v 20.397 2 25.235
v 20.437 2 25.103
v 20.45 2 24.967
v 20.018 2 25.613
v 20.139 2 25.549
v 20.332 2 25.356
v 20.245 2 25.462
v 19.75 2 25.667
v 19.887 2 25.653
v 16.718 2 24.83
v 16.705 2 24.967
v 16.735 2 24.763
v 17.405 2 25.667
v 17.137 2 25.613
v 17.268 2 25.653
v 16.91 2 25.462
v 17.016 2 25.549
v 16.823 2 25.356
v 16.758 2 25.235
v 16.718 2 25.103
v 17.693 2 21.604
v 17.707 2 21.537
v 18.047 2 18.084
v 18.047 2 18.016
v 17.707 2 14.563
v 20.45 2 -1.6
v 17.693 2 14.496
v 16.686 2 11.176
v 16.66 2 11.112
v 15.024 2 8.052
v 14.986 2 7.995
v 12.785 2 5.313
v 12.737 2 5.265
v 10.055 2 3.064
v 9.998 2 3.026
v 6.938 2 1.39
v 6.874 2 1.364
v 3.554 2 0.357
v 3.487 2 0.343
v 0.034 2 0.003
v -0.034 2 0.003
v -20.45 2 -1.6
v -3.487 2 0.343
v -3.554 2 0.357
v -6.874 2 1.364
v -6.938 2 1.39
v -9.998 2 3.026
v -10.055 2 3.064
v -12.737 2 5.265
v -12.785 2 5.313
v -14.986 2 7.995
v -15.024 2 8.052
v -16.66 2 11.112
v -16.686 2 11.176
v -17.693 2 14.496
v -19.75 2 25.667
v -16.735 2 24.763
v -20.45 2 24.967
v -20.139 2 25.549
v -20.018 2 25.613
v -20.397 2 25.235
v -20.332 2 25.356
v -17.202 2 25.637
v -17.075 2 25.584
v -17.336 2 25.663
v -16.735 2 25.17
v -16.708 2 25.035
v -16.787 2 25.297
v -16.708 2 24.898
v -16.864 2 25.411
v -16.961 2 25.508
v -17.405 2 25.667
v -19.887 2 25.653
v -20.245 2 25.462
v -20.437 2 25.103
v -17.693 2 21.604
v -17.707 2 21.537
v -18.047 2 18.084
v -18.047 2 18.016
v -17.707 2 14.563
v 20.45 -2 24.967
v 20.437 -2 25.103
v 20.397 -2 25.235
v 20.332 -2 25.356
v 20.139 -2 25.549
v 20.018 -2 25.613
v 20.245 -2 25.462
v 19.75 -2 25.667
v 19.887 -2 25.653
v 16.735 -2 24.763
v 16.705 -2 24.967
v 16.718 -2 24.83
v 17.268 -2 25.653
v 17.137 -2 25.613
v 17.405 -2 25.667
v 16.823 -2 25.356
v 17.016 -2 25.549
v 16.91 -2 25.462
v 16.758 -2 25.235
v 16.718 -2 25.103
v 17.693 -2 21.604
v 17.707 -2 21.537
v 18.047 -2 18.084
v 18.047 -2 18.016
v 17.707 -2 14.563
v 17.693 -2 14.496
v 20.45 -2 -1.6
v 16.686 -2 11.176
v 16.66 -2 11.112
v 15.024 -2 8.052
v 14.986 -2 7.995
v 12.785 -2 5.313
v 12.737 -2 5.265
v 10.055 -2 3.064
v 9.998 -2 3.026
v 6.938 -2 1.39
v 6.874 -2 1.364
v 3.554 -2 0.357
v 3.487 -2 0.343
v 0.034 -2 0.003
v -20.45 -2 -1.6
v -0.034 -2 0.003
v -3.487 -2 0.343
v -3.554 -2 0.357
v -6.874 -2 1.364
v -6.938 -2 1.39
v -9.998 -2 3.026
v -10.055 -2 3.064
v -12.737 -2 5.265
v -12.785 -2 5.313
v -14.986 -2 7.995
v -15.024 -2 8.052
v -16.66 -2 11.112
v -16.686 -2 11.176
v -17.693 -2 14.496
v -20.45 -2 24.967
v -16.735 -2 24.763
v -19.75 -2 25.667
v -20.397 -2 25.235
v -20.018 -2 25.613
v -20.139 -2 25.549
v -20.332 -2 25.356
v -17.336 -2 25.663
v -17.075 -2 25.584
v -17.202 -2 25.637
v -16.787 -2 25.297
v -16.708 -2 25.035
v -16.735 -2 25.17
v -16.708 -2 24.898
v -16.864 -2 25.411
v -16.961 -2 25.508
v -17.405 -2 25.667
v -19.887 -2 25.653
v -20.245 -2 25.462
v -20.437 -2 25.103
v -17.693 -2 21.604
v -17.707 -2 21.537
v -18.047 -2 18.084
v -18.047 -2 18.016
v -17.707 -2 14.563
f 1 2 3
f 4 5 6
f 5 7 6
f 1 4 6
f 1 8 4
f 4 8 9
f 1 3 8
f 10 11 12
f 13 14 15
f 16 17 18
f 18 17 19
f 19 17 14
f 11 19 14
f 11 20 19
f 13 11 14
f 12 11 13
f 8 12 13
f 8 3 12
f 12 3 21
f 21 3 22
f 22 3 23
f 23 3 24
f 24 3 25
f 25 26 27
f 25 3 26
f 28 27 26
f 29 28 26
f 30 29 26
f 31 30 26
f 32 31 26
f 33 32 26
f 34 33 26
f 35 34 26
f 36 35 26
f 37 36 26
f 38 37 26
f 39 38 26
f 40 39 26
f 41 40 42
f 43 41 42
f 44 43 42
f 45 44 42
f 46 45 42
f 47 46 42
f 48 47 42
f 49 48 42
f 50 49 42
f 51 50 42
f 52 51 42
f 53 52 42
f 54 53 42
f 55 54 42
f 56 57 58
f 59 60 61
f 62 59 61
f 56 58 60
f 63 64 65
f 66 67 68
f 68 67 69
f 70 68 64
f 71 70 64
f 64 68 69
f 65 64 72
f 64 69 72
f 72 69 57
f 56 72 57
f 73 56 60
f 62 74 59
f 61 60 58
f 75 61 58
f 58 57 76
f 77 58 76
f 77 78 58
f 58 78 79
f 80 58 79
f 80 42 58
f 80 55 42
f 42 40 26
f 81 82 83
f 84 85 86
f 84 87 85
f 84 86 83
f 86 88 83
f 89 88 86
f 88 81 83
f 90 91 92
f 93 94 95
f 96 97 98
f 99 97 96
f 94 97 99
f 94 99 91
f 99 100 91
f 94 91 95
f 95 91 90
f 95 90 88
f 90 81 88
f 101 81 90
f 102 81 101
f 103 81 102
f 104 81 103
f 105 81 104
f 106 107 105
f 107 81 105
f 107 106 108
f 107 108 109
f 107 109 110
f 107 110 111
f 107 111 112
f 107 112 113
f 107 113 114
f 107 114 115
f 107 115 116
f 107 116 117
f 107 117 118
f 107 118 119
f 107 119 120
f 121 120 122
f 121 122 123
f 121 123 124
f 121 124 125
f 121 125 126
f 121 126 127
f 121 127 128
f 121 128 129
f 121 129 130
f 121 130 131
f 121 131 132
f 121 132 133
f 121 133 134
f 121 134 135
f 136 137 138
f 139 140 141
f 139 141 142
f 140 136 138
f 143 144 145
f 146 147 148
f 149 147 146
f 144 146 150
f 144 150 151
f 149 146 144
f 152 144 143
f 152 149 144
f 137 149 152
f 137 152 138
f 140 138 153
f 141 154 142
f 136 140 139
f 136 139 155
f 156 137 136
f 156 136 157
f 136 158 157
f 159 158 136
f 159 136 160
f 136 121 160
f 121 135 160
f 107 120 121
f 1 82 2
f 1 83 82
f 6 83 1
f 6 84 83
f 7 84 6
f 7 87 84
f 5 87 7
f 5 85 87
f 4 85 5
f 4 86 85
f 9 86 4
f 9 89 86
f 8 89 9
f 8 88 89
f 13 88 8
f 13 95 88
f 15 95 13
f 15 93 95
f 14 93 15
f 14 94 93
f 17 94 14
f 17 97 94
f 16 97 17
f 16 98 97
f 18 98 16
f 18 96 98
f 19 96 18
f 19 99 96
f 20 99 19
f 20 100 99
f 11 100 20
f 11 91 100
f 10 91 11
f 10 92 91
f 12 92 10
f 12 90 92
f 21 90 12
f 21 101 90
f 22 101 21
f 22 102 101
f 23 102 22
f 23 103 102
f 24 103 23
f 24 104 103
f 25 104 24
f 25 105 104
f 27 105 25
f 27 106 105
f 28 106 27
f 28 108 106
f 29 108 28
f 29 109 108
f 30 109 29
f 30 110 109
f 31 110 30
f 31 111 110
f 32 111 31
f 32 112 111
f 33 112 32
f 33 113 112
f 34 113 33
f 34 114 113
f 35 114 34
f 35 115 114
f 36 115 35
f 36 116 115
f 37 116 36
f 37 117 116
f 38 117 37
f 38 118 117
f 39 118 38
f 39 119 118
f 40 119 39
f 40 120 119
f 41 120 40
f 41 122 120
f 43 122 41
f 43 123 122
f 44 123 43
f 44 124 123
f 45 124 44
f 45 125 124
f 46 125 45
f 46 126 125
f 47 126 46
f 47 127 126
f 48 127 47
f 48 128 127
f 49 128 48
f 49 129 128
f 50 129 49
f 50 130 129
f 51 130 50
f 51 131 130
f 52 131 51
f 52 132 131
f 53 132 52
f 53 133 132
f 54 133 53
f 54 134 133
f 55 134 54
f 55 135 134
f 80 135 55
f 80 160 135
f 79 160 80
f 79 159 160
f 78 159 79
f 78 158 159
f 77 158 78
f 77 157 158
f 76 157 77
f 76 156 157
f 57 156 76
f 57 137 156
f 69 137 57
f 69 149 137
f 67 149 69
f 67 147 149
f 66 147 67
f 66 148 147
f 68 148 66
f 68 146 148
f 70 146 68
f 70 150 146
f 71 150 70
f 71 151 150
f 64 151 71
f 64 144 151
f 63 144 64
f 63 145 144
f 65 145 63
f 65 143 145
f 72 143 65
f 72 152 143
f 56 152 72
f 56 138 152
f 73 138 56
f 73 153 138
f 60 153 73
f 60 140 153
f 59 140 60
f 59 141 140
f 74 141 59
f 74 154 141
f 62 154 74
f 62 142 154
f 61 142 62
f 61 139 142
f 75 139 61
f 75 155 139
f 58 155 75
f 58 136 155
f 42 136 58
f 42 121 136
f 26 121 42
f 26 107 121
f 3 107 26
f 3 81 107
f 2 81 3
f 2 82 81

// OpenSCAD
// FireLord Device Case

$fn = 32;

solar_panel_len = 160.4;
solar_panel_wid = 138.4;
solar_panel_h = 2.7;

perfboard_len = 90.4;
perfboard_wid = 70.4;
perfboard_thick = 1.6;
perfboard_leeway = 6.0; // spacing under the board
perfboard_hole_dia = 3.0;
// inset distances from each perboard corner
perfboard_hole_corner_x = 1.8+perfboard_hole_dia/2;
perfboard_hole_corner_y = 0.8+perfboard_hole_dia/2;

supercap_dia = 36.1;
supercap_len = 73.3;

lora_screw_shaft_dia = 1.9;
lora_screw_shaft_len = 6.1;
lora_screw_head_dia = 4.0;
lora_screw_head_len = 2.1;
// The LoRa module has three mounting holes in an
// isosceles triangle layout (if they're your vertices)
// These are the holes closest together (the base)
lora_hole_tria_base = 21.8-lora_screw_shaft_dia; // From far hole edge to far hole edge; -dia makes centered.
lora_hole_tria_h = 29.0+lora_screw_shaft_dia/2;
lora_antenna_hole_dia = 2.0;
// Offsets from top-most mount hole to antenna hole
lora_antenna_h_offset_x = -3.7;
lora_antenna_h_offset_y = -2.6;

wall_thick = 1.6;

supercap_clip_h = supercap_dia/6; // How far the clipping portion extends
cap_clip_rounding = 0.7;
cap_clip_section_thick = 4.0;

case_rounding = 4.0;

case_screw_dia = 3.0;

module loraScrewHole2D() {
    circle(d=lora_screw_shaft_dia);
}

module loraScrewHoles2D() {
    translate([-lora_hole_tria_base/2,0])
    circle(d=lora_screw_shaft_dia);
    translate([lora_hole_tria_base/2,0])
    circle(d=lora_screw_shaft_dia);
    translate([0,lora_hole_tria_h]) {
        circle(d=lora_screw_shaft_dia);
        //translate([lora_antenna_h_offset_x,lora_antenna_h_offset_y])
        //circle(d=lora_antenna_hole_dia);
    }
}

module perfboardHole2D() {
    circle(d=perfboard_hole_dia);
}

module perfboardHoles2D() {
    x_val = perfboard_len/2-perfboard_hole_corner_x;
    y_val = perfboard_wid/2-perfboard_hole_corner_y;

    translate([x_val, y_val])
    perfboardHole2D();
    translate([-x_val, y_val])
    perfboardHole2D();
    translate([x_val, -y_val])
    perfboardHole2D();
    translate([-x_val, -y_val])
    perfboardHole2D();
}
//perfboardHoles2D();

module capacitor2D() {
    circle(d=supercap_dia);
}

module capacitorClipDiff2D() {
    difference() {
        capacitor2D();
        translate([0,supercap_dia/2+supercap_clip_h])
        square(supercap_dia, center=true);
    }
}
//capacitorClipDiff2D();

// Side profile
module capacitorClipCircle2D() {
    difference() {
        offset(wall_thick)
        capacitorClipDiff2D();
        translate([0,supercap_dia/2+supercap_clip_h])
        square([supercap_dia+wall_thick*2, supercap_dia], center=true);
    }
}
//capacitorClipCircle2D();

module capacitorClip2D() {
    offset(cap_clip_rounding) offset(-cap_clip_rounding)
    difference() {
        hull() {
            capacitorClipCircle2D();
            translate([0,-supercap_dia/4+supercap_clip_h/2])
            square([supercap_dia+3*wall_thick, supercap_dia/2+supercap_clip_h+wall_thick*2], center=true);
        }
        capacitor2D();
    }
    translate([0,cap_clip_rounding/2-supercap_dia/2-wall_thick])
    square([supercap_dia+3*wall_thick, cap_clip_rounding], center=true);
}
//capacitorClip2D();
// Test translate of the screw hole
//translate([supercap_dia/2+perfboard_hole_dia/2+wall_thick,0])
//#square([perfboard_hole_dia, 10], center=true);

module capacitorClipSection3D() {
    translate([0,cap_clip_section_thick/2,supercap_dia/2])
    rotate([90,0,0])
    linear_extrude(cap_clip_section_thick)
    capacitorClip2D();
}
capacitorClipSection3D();

//module caseScrewHoles

module caseBodyHollow() {
    difference() {
        linear_extrude(supercap_dia*2)
        offset(case_rounding) offset(-case_rounding)
        square([solar_panel_len+4*wall_thick+2*case_screw_dia, solar_panel_wid+4*wall_thick+2*case_screw_dia], center=true);
        translate([0,0,wall_thick])
        linear_extrude(supercap_dia*2-wall_thick)
        offset(case_rounding) offset(-case_rounding)
        square([solar_panel_len, solar_panel_wid], center=true);
    }
}

//caseBodyHollow();
